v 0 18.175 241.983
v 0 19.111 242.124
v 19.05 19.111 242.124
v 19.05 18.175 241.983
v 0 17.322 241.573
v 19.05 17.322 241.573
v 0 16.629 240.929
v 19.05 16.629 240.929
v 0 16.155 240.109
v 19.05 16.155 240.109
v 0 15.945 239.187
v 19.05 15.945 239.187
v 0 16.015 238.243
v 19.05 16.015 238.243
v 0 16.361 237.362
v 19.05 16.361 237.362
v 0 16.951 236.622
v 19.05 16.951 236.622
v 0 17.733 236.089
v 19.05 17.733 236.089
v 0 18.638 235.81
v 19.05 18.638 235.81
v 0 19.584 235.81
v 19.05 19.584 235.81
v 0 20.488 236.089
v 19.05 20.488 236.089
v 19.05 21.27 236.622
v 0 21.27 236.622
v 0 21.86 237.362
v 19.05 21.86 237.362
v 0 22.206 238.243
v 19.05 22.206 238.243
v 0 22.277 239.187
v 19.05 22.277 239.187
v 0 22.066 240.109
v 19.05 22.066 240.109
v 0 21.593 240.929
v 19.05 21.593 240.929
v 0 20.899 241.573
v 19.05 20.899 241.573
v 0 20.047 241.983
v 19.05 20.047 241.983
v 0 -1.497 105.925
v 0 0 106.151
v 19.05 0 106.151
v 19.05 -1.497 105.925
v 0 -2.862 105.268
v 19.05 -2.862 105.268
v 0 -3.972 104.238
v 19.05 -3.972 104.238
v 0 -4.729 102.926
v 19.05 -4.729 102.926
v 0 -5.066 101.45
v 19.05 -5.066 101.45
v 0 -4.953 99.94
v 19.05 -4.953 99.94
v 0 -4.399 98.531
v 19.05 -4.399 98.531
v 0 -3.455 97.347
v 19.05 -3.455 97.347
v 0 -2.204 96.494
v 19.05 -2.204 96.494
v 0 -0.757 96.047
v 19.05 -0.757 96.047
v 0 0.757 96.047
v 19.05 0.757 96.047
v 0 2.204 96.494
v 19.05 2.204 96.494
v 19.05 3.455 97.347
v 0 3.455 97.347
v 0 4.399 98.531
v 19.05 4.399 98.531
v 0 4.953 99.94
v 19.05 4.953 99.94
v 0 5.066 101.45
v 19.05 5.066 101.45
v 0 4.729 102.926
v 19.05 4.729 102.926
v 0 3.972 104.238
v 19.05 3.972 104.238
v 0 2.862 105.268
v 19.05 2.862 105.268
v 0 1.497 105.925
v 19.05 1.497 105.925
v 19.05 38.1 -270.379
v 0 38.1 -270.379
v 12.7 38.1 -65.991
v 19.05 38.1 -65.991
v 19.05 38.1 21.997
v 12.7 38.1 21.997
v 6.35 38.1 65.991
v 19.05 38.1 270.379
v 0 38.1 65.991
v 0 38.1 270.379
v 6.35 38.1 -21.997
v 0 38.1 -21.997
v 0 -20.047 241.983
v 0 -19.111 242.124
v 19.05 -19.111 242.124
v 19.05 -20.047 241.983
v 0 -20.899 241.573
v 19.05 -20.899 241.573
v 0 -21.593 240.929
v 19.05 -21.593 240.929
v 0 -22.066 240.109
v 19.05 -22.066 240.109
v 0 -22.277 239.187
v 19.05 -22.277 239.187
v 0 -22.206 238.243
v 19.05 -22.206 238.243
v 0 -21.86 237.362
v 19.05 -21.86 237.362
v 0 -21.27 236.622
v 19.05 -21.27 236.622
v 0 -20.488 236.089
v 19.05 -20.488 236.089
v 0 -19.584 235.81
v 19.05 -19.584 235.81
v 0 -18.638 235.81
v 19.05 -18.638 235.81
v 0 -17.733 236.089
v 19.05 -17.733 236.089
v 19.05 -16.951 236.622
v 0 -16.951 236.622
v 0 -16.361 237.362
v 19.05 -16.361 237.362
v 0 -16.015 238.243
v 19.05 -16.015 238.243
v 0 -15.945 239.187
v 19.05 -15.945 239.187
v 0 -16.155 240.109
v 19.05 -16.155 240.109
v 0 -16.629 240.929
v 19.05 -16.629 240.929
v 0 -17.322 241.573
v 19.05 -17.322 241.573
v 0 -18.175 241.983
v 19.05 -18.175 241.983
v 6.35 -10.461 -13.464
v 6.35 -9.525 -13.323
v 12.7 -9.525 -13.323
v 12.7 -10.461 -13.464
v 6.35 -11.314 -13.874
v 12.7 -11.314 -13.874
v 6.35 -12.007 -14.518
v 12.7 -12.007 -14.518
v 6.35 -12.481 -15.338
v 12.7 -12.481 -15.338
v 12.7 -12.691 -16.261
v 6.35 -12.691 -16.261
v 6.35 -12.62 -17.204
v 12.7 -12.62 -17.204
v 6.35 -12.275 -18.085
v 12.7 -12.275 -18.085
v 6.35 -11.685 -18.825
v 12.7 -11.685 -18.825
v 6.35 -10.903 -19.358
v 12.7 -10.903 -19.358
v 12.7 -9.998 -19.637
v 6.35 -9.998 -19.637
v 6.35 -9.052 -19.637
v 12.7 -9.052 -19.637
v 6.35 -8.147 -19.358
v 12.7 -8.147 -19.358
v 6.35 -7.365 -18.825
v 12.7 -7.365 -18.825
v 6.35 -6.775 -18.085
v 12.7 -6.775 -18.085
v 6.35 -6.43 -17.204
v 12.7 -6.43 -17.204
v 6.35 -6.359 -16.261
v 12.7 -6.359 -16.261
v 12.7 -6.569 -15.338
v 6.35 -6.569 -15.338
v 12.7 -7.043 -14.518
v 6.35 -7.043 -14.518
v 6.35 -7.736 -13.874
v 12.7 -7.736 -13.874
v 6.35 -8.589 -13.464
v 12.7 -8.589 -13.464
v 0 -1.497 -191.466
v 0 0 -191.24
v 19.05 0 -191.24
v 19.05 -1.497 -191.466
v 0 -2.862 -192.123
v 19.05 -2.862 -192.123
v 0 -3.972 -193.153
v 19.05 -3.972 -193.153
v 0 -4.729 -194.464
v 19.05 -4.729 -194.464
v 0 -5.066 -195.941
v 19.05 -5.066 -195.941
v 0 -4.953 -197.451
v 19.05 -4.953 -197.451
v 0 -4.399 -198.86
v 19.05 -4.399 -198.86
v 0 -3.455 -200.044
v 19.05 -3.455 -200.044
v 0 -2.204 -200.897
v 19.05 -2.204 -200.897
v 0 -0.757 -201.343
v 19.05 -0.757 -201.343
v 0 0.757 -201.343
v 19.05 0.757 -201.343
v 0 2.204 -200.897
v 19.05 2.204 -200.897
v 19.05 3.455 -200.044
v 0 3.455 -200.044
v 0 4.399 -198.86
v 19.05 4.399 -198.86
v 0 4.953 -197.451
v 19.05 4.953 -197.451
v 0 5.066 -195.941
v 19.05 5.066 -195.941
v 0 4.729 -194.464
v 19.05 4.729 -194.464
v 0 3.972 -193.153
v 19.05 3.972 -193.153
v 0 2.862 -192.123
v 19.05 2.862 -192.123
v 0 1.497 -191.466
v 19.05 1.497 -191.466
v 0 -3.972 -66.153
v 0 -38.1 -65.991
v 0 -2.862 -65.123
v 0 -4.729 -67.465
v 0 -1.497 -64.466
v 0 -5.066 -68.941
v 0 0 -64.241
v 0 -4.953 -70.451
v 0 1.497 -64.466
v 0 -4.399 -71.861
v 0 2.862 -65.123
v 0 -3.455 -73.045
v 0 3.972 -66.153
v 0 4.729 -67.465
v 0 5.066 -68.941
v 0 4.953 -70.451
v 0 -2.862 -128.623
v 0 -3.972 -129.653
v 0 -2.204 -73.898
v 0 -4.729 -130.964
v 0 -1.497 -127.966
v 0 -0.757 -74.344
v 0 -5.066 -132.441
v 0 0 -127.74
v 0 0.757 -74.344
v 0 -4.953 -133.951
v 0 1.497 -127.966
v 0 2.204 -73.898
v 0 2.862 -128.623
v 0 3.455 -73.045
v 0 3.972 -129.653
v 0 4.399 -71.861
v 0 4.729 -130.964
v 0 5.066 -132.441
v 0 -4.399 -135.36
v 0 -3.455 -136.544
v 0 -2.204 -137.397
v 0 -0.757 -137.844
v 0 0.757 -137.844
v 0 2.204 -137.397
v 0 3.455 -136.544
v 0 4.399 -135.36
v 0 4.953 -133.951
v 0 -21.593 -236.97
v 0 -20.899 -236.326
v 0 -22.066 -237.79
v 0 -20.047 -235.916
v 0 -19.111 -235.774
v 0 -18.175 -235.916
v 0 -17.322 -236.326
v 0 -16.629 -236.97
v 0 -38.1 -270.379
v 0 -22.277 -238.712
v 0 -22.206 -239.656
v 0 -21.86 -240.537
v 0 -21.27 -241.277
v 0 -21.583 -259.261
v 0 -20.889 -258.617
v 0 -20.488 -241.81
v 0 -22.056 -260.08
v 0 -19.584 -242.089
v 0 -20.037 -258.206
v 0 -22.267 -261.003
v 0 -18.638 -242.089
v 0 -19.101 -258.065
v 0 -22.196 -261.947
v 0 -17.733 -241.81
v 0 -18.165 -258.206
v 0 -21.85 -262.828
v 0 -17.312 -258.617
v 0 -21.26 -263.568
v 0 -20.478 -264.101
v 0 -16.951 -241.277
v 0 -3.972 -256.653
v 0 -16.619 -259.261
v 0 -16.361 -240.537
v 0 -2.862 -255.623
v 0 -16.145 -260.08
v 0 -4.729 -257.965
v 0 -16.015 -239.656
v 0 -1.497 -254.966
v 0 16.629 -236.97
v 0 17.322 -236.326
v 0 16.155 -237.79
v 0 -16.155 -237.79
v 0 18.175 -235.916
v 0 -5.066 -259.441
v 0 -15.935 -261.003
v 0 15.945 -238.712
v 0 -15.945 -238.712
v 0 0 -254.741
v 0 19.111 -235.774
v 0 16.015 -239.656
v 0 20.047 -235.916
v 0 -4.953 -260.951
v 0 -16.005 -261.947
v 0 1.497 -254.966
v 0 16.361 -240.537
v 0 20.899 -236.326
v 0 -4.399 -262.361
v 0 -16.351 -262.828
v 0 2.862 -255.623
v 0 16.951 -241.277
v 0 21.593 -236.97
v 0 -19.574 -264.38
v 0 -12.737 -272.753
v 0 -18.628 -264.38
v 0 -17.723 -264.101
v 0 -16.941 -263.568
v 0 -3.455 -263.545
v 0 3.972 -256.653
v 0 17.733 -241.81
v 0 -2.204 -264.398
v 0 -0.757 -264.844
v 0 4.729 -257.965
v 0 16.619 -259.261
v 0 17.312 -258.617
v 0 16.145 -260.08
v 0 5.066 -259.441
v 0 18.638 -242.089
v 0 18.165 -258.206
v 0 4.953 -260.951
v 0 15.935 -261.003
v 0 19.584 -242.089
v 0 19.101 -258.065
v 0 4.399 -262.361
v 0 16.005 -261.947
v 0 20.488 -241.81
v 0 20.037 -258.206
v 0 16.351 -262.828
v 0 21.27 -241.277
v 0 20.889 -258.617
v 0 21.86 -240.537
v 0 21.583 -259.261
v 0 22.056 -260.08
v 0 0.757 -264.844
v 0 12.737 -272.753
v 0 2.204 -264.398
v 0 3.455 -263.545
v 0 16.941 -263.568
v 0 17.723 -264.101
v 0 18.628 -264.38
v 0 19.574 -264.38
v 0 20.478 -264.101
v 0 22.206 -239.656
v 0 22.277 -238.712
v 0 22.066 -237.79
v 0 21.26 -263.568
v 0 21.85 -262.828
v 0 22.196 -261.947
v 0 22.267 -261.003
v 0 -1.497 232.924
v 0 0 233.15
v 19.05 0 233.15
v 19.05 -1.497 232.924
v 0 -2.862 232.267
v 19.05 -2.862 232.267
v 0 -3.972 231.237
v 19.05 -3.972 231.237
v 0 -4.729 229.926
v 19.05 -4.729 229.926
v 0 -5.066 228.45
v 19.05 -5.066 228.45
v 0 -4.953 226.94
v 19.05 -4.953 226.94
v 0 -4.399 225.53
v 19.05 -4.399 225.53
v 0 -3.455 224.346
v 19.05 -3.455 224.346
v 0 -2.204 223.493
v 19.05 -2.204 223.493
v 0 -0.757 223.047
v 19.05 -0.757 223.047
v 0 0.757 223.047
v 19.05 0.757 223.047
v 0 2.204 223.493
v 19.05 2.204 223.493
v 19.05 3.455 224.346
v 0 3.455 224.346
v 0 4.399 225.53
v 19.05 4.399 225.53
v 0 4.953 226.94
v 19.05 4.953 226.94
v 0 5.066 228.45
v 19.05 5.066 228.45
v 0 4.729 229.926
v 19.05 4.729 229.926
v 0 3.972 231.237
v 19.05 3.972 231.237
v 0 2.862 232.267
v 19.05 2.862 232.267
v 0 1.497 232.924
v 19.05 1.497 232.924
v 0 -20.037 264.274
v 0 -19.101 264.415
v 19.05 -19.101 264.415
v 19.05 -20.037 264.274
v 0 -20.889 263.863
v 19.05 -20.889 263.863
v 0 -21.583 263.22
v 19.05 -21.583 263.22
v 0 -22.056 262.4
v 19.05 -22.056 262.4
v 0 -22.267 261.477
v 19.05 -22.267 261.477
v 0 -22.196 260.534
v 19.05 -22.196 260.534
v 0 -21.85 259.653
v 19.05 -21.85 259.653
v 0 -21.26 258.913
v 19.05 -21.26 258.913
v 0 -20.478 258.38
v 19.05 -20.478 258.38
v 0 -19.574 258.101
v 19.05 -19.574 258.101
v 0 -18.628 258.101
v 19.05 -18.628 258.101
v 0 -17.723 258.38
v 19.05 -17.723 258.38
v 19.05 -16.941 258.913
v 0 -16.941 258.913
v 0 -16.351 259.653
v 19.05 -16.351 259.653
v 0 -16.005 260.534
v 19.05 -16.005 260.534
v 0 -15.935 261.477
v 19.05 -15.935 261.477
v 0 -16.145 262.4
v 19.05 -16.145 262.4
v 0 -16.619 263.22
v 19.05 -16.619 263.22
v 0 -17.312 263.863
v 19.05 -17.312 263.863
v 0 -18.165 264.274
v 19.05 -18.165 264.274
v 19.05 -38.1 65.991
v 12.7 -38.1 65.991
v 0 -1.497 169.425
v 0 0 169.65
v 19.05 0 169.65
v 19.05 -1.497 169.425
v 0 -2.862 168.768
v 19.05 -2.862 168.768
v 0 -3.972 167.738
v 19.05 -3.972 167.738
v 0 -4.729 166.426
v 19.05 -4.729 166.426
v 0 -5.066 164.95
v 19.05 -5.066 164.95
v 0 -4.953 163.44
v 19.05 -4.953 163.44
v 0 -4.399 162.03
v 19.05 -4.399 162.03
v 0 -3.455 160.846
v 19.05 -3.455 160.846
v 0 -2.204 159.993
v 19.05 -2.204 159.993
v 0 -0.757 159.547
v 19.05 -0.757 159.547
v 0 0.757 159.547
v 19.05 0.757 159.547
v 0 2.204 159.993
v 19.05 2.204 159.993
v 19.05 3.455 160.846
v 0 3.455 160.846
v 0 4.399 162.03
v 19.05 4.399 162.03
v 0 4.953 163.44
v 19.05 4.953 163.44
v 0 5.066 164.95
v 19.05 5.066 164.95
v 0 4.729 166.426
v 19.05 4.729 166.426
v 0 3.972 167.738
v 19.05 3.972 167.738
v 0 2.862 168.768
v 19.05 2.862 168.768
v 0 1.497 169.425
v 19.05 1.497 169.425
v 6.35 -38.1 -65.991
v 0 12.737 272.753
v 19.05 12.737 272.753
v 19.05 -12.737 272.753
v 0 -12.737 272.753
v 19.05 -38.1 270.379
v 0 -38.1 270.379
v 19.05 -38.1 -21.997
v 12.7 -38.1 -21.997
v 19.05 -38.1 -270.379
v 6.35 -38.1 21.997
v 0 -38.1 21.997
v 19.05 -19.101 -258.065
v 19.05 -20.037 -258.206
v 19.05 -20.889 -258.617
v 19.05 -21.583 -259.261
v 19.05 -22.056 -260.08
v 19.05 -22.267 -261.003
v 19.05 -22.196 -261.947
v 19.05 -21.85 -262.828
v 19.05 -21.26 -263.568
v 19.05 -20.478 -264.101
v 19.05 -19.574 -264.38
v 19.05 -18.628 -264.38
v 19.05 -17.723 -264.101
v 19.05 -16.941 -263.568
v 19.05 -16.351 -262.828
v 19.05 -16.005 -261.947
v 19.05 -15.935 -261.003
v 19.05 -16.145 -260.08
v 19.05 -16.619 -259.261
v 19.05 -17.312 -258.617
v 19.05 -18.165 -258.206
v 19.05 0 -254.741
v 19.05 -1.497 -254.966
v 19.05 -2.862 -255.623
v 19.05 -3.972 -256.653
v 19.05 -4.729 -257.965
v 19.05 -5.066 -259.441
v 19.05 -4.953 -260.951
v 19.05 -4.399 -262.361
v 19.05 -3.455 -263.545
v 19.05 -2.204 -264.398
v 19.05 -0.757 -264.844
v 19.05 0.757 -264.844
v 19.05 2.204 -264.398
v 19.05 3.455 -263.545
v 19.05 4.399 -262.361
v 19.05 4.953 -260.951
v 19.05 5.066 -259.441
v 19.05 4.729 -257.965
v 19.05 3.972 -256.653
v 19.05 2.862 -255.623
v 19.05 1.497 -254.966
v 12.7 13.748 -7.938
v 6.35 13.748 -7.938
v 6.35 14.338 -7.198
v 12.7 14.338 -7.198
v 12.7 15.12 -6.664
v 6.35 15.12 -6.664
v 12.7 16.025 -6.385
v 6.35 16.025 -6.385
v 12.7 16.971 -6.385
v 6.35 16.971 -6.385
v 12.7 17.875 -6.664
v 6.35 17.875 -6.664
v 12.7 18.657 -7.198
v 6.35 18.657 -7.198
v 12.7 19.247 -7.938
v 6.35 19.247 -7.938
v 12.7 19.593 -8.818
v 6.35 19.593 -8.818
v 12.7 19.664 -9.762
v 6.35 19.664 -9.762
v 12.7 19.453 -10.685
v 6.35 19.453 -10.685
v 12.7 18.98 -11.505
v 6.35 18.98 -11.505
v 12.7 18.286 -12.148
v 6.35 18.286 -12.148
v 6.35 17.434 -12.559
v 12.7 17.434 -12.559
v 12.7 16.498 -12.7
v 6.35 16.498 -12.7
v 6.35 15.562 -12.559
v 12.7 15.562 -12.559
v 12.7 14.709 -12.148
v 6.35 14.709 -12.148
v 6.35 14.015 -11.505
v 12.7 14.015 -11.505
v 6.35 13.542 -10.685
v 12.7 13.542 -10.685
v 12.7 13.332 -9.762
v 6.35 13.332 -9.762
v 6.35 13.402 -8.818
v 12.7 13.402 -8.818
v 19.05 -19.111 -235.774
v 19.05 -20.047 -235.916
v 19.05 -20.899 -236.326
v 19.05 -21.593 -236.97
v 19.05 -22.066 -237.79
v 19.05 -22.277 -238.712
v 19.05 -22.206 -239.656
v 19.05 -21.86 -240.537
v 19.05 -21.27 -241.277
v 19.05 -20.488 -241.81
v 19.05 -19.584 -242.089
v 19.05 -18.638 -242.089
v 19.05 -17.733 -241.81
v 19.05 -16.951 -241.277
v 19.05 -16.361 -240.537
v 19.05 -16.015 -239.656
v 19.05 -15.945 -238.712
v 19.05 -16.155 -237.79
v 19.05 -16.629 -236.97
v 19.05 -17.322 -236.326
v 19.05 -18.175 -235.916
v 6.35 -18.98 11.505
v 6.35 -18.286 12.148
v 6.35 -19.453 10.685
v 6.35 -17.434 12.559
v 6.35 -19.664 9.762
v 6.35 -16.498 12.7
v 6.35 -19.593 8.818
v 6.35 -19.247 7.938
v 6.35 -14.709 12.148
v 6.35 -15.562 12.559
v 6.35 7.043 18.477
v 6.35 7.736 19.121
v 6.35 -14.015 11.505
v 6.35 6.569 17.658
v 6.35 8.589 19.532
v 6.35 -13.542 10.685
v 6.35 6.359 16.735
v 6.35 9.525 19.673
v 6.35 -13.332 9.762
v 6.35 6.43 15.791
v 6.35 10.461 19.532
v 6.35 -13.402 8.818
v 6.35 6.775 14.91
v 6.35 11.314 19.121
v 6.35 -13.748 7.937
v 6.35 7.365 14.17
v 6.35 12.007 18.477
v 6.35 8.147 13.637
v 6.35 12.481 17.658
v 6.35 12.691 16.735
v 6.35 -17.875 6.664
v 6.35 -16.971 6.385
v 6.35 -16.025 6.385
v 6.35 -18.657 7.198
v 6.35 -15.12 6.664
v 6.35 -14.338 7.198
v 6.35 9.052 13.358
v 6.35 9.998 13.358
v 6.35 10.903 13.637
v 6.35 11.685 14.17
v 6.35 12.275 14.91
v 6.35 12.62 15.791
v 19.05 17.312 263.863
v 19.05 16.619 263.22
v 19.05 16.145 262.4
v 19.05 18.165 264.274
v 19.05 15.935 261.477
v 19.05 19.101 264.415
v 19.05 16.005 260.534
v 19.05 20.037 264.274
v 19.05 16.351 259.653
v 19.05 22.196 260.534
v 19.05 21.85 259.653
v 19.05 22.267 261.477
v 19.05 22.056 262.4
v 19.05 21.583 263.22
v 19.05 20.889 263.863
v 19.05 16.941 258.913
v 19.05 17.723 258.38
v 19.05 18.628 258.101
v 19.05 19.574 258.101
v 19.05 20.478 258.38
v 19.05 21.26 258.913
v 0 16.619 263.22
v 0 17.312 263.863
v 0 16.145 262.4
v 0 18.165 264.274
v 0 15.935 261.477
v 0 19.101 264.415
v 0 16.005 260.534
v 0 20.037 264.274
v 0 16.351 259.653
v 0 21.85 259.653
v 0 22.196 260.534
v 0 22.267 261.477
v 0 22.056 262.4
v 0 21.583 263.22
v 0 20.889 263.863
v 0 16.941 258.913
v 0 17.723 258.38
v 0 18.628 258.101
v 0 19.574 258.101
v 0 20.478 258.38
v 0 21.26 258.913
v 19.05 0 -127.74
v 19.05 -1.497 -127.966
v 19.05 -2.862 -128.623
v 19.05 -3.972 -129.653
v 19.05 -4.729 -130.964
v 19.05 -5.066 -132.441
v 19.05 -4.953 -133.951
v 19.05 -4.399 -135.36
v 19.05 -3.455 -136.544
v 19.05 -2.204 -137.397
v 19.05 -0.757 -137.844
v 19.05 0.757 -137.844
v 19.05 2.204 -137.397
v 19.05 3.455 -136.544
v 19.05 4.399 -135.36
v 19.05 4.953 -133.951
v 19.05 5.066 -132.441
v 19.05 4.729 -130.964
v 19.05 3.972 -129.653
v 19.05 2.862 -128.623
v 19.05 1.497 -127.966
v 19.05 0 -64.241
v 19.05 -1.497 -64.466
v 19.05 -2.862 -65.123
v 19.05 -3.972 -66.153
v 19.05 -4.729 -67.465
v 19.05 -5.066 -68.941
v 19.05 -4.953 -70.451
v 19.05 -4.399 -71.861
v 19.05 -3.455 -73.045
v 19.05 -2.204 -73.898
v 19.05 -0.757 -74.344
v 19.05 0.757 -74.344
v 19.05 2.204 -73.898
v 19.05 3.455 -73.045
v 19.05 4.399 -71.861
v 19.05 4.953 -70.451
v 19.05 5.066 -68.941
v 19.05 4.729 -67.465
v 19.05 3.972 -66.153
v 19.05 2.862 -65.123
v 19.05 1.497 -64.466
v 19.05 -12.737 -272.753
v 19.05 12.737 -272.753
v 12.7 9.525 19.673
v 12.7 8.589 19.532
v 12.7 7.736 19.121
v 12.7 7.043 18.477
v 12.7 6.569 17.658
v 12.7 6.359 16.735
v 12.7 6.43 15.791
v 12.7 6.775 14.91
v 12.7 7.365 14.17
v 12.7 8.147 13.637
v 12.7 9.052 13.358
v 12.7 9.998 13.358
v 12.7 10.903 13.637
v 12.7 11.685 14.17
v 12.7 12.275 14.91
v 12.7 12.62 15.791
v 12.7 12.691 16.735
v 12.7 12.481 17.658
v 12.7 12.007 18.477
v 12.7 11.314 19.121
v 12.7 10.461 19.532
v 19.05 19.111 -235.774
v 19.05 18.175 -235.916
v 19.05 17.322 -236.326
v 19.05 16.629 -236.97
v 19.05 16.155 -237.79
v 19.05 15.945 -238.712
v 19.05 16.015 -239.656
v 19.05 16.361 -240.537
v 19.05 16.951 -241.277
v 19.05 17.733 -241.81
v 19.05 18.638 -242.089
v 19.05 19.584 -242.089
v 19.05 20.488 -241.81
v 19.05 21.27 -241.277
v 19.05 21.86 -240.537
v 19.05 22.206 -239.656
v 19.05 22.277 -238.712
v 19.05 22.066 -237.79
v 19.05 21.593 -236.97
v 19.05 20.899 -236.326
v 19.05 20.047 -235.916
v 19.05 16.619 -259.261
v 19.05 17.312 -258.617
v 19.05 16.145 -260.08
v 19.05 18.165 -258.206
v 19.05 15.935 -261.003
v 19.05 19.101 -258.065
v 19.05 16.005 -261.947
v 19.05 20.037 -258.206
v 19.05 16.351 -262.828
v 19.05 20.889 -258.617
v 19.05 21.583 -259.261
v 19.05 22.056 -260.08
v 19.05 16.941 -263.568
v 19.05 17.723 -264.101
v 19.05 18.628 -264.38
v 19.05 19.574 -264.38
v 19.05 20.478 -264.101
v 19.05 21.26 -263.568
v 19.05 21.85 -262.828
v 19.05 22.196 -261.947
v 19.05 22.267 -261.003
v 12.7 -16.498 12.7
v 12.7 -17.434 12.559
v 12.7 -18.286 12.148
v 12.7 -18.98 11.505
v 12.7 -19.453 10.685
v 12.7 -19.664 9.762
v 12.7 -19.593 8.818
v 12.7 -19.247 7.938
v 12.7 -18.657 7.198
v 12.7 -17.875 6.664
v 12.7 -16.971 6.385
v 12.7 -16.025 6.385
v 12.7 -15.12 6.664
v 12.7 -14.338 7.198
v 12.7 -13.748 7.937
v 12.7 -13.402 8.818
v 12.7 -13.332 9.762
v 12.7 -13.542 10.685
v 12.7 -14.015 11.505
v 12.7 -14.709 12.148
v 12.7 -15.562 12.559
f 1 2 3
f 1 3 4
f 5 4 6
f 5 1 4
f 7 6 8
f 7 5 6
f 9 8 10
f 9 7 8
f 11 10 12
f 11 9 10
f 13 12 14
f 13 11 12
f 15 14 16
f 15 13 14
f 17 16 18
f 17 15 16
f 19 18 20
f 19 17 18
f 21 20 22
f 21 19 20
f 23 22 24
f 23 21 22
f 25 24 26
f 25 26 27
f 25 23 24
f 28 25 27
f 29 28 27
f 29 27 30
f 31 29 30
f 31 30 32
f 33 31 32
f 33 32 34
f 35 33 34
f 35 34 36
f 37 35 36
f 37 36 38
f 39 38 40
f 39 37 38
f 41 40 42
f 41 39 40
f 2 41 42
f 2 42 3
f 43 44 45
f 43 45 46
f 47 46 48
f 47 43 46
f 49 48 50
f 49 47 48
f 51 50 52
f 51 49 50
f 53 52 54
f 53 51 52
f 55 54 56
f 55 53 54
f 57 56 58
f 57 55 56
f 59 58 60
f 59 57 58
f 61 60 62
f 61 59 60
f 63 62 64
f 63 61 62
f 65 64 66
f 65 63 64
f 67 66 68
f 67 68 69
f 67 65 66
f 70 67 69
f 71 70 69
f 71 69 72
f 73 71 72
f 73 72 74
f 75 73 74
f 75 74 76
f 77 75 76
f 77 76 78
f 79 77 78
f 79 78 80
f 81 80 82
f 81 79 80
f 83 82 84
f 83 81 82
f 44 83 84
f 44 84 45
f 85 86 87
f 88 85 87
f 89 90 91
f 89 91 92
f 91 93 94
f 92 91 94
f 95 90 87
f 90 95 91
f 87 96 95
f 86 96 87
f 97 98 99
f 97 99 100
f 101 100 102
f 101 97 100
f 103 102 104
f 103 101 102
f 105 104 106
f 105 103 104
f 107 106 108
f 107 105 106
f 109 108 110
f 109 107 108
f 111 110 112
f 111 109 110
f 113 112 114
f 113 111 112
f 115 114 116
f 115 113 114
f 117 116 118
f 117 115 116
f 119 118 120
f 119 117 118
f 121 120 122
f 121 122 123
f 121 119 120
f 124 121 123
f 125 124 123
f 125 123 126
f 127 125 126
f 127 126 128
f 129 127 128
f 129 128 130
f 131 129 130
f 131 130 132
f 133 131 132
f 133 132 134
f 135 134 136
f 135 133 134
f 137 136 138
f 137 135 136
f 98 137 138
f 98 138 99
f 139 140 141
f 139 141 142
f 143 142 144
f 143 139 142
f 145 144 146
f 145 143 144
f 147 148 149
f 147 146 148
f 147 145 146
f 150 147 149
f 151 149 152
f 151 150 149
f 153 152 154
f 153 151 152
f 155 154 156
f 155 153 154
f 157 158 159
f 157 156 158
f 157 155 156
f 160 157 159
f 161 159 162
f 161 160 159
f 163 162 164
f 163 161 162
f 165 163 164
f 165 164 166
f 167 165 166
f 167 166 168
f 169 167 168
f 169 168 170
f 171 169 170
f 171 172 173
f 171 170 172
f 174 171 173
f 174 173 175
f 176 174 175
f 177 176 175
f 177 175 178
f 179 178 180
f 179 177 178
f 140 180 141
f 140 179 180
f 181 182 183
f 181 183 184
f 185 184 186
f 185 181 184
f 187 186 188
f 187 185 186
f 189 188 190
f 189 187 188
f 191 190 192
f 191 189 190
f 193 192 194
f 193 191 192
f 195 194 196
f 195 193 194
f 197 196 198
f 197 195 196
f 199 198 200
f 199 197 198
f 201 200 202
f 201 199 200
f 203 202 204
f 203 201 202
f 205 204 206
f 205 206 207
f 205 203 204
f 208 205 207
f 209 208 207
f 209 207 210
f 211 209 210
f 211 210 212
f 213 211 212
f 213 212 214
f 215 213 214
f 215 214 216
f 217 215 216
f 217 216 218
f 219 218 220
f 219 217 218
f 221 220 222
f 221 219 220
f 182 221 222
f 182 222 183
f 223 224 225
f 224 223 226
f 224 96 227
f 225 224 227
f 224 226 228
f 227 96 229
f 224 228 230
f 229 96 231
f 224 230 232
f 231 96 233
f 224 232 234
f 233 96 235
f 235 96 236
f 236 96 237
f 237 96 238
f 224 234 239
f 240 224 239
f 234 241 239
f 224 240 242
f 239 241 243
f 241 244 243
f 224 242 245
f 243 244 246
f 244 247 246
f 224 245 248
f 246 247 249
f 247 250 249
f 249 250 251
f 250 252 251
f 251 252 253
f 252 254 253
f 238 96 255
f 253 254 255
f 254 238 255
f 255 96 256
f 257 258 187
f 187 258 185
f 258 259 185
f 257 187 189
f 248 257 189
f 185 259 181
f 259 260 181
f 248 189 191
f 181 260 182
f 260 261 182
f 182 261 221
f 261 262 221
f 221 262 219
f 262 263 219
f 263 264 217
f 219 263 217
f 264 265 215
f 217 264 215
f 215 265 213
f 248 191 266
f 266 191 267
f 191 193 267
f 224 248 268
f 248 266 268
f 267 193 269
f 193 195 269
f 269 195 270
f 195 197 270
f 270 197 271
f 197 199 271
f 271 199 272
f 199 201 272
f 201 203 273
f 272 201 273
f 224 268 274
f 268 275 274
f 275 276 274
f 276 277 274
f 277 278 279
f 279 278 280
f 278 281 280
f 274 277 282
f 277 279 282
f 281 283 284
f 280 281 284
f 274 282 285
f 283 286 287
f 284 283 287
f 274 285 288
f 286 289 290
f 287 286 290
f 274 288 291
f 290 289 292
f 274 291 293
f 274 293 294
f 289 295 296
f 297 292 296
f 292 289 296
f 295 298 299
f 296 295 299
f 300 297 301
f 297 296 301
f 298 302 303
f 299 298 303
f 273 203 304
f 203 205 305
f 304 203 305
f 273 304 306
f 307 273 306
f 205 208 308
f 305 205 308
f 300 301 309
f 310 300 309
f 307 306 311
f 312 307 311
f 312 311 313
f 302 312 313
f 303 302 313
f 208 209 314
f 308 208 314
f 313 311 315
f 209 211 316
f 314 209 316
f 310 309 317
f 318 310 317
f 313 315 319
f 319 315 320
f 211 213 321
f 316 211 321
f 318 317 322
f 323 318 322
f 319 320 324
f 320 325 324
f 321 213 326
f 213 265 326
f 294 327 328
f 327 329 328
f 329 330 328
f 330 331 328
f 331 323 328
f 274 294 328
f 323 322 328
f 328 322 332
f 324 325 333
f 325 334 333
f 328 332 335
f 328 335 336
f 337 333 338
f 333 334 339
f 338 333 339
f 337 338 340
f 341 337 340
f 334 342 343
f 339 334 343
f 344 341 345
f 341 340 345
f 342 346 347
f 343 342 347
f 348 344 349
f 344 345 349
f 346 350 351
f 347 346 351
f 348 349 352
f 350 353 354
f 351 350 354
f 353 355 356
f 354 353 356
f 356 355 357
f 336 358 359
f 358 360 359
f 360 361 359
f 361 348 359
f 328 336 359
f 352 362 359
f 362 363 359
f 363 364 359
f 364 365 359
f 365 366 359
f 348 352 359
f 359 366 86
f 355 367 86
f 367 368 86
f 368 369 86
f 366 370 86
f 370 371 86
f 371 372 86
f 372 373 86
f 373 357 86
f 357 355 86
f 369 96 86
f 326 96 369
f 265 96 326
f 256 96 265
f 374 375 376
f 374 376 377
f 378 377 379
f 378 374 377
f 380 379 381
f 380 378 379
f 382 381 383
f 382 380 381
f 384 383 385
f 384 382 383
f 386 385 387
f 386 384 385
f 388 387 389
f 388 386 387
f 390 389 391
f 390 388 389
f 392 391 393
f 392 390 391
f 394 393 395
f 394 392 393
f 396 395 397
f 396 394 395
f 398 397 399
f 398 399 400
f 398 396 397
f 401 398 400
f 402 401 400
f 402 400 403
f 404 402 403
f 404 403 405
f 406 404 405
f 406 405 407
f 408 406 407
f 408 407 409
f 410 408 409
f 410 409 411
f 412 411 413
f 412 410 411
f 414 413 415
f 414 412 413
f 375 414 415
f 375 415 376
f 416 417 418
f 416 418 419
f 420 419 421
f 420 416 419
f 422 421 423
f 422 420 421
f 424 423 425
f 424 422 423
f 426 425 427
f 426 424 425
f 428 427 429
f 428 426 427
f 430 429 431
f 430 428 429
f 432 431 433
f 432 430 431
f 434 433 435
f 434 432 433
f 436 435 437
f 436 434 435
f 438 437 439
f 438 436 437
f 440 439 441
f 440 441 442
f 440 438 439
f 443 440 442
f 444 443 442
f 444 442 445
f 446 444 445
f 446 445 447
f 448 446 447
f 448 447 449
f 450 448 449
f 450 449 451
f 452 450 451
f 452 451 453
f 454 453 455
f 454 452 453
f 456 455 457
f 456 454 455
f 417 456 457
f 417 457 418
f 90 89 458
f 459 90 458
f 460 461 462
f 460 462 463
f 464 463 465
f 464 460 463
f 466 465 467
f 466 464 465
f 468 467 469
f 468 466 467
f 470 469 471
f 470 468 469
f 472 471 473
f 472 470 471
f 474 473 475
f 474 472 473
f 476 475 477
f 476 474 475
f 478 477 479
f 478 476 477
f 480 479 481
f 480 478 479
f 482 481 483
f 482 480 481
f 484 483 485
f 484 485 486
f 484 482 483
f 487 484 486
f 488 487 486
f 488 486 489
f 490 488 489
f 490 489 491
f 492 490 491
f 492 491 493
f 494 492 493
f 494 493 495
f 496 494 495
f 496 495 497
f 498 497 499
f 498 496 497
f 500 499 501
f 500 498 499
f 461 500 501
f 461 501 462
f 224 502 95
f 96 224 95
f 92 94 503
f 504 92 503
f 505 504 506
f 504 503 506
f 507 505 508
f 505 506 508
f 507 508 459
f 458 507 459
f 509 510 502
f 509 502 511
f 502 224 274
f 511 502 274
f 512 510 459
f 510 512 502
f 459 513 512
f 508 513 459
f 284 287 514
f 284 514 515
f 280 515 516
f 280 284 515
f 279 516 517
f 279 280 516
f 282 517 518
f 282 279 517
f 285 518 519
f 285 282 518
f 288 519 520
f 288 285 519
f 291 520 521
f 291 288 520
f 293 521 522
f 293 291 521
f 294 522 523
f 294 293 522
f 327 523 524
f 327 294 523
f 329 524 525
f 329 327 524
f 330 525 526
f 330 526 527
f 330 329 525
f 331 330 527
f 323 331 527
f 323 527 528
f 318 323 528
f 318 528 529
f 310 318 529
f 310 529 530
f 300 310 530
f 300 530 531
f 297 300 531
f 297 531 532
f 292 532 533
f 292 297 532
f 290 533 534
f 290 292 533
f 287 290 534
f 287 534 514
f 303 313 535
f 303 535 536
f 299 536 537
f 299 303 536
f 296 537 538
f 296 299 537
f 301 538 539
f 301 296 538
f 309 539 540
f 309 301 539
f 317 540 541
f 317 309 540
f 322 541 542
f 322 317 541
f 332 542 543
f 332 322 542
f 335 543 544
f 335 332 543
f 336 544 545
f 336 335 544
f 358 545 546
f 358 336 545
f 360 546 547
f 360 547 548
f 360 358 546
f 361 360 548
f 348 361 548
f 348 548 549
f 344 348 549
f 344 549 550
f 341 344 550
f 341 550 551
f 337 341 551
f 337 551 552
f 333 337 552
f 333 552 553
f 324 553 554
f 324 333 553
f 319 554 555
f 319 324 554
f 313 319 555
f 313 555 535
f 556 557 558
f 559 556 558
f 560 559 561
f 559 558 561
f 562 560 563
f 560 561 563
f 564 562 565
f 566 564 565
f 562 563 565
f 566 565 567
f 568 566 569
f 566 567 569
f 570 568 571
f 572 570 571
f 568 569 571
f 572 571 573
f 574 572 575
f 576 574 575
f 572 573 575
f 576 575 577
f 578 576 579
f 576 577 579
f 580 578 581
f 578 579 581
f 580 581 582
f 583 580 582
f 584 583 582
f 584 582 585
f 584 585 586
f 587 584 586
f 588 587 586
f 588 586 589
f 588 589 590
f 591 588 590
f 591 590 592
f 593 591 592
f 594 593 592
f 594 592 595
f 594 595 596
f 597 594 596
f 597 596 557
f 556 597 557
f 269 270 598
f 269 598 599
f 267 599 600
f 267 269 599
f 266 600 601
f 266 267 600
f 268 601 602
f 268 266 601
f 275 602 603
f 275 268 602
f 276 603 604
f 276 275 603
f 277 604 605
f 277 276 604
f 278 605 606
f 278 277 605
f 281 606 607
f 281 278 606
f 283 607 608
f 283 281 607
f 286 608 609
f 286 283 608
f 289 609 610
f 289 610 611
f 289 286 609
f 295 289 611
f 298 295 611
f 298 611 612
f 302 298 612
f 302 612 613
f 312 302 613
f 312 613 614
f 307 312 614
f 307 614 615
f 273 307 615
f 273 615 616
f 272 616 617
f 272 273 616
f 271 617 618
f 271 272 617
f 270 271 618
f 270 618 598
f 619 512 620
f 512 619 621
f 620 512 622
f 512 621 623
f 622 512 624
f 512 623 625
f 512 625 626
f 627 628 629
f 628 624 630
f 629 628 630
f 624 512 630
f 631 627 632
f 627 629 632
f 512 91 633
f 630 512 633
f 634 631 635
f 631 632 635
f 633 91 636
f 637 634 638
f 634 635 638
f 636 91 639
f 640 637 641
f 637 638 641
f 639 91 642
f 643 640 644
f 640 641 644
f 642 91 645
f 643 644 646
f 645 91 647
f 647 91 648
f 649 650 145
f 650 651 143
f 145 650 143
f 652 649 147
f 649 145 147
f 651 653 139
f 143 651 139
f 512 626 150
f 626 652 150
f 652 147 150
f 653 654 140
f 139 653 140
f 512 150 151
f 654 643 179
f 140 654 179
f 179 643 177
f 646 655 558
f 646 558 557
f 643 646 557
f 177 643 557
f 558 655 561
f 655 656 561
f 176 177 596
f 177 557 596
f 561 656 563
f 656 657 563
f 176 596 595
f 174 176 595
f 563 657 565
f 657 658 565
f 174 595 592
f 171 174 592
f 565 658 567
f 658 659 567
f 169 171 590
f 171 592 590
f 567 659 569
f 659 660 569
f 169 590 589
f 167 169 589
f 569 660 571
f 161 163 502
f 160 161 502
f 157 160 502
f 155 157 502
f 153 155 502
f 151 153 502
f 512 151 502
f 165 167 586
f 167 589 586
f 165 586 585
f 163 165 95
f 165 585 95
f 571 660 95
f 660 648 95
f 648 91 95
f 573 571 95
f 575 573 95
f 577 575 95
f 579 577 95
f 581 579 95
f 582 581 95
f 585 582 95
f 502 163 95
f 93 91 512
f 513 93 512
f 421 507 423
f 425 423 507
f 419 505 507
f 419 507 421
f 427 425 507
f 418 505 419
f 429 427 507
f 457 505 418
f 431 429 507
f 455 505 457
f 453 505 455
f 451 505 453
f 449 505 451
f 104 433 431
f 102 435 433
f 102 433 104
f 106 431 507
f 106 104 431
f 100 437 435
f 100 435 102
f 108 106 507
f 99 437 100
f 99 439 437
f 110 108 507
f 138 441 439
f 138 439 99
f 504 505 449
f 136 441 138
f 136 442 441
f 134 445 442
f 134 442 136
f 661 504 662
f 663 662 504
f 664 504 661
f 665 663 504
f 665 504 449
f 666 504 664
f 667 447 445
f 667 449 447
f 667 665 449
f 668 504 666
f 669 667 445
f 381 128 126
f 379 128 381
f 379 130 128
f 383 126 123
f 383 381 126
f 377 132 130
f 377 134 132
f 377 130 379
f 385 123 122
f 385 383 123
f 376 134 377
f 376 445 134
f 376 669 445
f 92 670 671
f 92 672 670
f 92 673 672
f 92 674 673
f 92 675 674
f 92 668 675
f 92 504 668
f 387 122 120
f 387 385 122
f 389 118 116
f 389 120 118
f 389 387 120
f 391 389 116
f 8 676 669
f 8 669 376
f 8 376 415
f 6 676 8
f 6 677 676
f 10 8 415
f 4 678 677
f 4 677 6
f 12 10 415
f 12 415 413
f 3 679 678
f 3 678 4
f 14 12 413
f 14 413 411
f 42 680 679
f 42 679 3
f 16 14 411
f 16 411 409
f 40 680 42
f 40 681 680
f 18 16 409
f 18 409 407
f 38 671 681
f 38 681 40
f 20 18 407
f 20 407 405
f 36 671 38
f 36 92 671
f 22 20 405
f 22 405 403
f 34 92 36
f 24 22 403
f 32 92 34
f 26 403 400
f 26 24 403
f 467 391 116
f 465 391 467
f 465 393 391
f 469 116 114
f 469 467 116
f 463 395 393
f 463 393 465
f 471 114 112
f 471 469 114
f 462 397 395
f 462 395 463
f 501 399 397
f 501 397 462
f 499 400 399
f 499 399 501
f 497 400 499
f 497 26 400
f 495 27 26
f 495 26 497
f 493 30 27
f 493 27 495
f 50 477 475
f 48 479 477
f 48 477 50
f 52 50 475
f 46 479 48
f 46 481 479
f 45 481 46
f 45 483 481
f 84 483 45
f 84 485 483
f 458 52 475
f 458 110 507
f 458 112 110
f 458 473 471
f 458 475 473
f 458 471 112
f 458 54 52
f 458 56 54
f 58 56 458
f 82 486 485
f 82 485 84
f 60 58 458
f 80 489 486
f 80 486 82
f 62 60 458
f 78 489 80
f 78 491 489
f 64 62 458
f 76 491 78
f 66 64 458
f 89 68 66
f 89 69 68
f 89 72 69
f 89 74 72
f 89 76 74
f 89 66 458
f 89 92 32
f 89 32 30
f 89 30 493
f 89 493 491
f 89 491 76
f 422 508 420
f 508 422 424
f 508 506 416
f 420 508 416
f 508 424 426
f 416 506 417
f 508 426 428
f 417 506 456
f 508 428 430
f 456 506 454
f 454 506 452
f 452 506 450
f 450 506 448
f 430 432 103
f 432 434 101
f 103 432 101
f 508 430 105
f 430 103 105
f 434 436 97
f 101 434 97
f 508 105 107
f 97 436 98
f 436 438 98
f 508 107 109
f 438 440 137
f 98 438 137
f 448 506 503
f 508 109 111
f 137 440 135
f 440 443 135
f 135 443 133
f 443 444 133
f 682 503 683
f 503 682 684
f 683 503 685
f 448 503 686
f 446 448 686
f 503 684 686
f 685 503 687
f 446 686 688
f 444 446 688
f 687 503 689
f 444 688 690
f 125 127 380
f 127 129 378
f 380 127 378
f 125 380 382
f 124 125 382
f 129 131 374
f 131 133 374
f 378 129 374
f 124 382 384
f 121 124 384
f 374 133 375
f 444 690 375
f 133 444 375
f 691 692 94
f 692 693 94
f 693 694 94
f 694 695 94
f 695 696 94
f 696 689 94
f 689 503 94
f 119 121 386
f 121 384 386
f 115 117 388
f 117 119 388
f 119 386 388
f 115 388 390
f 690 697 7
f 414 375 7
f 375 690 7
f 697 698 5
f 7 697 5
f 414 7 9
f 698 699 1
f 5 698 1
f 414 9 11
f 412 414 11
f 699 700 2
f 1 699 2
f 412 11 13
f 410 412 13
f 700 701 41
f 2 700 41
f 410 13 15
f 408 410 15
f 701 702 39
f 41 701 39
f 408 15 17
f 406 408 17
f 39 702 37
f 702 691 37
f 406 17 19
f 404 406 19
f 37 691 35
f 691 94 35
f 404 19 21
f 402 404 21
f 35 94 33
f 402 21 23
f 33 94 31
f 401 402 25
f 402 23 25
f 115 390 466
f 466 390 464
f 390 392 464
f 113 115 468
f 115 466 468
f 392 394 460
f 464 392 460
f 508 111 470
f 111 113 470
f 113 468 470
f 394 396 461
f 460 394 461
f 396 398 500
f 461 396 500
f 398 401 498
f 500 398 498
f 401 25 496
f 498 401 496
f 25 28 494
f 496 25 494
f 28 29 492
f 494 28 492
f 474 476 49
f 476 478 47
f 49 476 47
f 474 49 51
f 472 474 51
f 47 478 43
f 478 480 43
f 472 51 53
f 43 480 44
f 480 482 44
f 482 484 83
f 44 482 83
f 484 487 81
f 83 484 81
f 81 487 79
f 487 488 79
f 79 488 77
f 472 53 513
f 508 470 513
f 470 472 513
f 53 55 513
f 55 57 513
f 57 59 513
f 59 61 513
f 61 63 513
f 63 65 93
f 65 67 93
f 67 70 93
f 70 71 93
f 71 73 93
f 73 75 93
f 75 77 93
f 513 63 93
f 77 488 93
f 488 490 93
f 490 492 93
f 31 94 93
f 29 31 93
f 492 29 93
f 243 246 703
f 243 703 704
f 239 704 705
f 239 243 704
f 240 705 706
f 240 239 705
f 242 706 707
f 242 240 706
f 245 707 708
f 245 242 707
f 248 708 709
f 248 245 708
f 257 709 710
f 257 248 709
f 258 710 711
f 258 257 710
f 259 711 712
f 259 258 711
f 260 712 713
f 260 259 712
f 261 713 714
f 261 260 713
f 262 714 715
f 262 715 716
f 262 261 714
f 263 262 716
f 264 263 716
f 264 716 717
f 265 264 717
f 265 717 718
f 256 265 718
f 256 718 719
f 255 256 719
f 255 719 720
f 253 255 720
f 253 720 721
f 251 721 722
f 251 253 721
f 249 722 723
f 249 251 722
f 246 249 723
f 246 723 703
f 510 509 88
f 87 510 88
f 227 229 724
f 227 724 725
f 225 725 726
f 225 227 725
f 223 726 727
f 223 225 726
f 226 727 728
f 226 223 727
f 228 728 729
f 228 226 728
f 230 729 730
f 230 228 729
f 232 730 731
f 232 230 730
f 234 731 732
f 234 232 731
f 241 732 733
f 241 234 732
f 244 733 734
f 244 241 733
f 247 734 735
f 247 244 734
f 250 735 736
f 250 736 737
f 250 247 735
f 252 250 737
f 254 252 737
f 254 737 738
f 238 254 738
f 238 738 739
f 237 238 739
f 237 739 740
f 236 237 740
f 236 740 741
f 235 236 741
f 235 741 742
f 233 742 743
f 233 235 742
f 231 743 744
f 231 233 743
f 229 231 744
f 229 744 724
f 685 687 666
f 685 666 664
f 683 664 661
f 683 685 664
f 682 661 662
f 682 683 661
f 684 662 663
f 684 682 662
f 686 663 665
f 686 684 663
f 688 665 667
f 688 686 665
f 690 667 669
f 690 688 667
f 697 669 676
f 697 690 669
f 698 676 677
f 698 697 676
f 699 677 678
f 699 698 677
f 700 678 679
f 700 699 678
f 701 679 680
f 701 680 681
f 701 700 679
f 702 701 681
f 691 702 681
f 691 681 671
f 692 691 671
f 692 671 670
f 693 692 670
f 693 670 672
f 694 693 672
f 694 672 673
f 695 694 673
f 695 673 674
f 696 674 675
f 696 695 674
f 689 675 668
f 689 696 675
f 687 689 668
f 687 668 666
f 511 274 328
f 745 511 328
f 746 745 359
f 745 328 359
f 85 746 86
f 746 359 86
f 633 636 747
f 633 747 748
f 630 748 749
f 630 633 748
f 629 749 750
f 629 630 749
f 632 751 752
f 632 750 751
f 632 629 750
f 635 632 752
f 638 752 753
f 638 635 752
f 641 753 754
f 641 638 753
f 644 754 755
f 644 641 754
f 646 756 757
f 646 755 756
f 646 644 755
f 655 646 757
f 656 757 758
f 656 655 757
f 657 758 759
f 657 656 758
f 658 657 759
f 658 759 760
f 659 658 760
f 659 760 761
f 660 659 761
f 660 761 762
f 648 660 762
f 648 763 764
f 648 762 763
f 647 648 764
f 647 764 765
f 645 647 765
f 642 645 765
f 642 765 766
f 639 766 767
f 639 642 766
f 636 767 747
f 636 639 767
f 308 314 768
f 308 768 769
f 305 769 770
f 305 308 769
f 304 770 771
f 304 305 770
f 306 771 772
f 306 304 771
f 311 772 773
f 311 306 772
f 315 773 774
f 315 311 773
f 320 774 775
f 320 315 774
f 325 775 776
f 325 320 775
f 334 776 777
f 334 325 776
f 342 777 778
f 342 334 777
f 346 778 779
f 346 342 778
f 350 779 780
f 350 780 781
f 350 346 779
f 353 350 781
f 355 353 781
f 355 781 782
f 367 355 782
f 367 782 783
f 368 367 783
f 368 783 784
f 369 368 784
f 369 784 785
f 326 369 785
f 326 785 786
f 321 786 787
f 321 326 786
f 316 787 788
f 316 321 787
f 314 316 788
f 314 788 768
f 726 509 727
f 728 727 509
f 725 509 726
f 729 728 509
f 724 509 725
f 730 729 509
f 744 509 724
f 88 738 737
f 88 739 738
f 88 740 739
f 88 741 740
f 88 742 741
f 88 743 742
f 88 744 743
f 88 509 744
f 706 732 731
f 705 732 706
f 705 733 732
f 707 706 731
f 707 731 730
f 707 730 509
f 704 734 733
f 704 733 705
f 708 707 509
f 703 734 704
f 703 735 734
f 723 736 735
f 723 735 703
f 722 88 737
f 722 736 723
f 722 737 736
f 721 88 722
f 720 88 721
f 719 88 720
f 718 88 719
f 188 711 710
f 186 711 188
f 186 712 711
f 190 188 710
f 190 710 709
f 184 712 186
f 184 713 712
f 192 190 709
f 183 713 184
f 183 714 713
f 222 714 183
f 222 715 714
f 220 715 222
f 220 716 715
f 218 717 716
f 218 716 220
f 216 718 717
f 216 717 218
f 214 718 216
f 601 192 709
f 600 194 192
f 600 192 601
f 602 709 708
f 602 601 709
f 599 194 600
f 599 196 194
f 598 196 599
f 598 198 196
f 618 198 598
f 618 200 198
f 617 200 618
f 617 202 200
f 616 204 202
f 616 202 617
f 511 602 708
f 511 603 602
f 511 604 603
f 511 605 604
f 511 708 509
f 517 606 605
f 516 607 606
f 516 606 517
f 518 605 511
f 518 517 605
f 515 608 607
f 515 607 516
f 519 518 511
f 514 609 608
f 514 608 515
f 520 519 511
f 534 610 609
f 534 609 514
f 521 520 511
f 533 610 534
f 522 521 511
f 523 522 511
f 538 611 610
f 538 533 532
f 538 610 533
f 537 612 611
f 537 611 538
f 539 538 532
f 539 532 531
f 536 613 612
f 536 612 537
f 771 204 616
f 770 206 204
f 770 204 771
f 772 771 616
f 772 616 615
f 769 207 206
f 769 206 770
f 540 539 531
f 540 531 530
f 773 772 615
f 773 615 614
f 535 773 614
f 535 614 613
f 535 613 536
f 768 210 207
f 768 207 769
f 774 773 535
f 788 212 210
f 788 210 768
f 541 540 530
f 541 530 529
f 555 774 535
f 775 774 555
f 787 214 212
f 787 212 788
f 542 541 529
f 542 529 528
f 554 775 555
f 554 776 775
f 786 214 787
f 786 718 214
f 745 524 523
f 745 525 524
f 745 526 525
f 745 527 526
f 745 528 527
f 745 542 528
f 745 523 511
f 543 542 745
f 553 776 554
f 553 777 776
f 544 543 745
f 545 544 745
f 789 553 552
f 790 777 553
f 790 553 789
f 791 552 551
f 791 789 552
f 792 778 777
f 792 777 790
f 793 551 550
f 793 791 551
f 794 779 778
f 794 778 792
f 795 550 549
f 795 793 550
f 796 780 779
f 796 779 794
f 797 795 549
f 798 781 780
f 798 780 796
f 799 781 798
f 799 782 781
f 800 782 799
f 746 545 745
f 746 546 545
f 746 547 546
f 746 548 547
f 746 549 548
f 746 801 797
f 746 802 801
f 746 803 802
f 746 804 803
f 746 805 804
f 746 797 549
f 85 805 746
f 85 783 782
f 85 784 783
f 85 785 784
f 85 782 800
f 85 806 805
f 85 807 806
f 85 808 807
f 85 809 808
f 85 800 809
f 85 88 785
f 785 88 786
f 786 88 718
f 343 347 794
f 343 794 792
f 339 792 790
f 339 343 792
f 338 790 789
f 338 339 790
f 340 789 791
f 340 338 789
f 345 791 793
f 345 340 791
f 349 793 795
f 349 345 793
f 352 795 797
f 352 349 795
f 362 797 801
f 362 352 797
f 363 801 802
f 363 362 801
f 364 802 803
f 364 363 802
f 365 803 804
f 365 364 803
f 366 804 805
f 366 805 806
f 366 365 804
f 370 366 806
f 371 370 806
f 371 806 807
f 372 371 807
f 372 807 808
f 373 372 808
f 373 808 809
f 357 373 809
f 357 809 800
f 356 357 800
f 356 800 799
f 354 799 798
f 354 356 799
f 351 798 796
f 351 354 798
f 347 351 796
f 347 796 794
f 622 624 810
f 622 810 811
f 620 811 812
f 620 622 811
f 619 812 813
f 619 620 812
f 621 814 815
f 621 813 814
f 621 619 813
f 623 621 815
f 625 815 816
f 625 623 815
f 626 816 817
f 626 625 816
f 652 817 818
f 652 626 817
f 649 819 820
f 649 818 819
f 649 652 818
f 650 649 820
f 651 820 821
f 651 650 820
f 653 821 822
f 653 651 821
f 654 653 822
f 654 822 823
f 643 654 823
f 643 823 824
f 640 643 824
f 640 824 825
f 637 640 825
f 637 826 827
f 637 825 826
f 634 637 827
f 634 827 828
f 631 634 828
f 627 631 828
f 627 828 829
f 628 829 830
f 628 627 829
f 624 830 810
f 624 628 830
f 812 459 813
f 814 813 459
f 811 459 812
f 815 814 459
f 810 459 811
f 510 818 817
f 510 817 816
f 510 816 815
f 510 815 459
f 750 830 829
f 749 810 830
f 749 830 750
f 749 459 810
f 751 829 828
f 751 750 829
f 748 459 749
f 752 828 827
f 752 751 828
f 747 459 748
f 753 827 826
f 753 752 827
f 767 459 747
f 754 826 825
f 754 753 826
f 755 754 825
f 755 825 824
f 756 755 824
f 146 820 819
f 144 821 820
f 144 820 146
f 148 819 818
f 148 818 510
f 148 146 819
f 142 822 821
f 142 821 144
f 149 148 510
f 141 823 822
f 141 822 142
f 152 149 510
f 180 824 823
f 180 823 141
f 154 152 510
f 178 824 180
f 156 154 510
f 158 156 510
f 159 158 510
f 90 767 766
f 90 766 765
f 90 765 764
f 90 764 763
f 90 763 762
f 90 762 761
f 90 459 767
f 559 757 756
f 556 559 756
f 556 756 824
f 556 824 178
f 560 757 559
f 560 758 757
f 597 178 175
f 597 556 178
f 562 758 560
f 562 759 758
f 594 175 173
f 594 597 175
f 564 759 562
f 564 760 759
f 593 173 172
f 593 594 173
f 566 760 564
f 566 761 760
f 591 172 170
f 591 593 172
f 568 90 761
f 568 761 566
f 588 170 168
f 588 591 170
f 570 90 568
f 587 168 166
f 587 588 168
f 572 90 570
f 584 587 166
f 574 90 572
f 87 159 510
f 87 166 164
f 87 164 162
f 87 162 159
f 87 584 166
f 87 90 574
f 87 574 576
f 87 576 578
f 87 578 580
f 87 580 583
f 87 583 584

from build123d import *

# Parameters (mm, degrees)
SKETCH2_R           = 3.175
SKETCH2_R_2         = 5.08
BOSS_EXTRUDE1_DEPTH = 19.05
CUT_EXTRUDE2_START  = -12.7
CUT_EXTRUDE2_DEPTH  = 6.35
CUT_EXTRUDE3_DEPTH  = 6.35


with BuildPart() as part:
    # Sketch2 → Boss-Extrude1 (new body)
    with BuildSketch(Plane(origin=(0, 0, 0), x_dir=(0, 0, -1), z_dir=(1, 0, 0))):
        with BuildLine():
            Line((21.997045256, 38.1), (-270.378794472, 38.1))
            ThreePointArc((-270.378794472, 38.1), (-273.05, 0), (-270.378794472, -38.1))
            Line((-270.378794472, -38.1), (270.378794472, -38.1))
            ThreePointArc((270.378794472, -38.1), (273.05, 0), (270.378794472, 38.1))
            Line((270.378794472, 38.1), (21.997045256, 38.1))
        make_face()
        with BuildLine():
            ThreePointArc((11.1125, 19.247414599), (12.274630657, 14.910283942), (7.9375, 13.748153285))
            ThreePointArc((7.9375, 13.748153285), (6.775369343, 18.085283942), (11.1125, 19.247414599))
        make_face(mode=Mode.SUBTRACT)
        with Locations((-16.497783942, 9.525)):
            Circle(SKETCH2_R, mode=Mode.SUBTRACT)
        with Locations((-9.525, -16.497783942)):
            Circle(SKETCH2_R, mode=Mode.SUBTRACT)
        with Locations((16.497783942, -9.525)):
            Circle(SKETCH2_R, mode=Mode.SUBTRACT)
        with Locations((-228.070127818, 0)):
            Circle(SKETCH2_R_2, mode=Mode.SUBTRACT)
        with Locations((-101.070508964, 0)):
            Circle(SKETCH2_R_2, mode=Mode.SUBTRACT)
        with Locations((-164.570319717, 0)):
            Circle(SKETCH2_R_2, mode=Mode.SUBTRACT)
        with Locations((196.320223938, 0)):
            Circle(SKETCH2_R_2, mode=Mode.SUBTRACT)
        with Locations((132.82041491, 0)):
            Circle(SKETCH2_R_2, mode=Mode.SUBTRACT)
        with Locations((69.320600315, 0)):
            Circle(SKETCH2_R_2, mode=Mode.SUBTRACT)
        with Locations((-261.240141142, 19.100852393)):
            Circle(SKETCH2_R, mode=Mode.SUBTRACT)
        with Locations((-238.949490115, 19.110830171)):
            Circle(SKETCH2_R, mode=Mode.SUBTRACT)
        with Locations((-261.240141142, -19.100852393)):
            Circle(SKETCH2_R, mode=Mode.SUBTRACT)
        with Locations((-238.949490115, -19.110830171)):
            Circle(SKETCH2_R, mode=Mode.SUBTRACT)
        with Locations((261.240141142, 19.100852393)):
            Circle(SKETCH2_R, mode=Mode.SUBTRACT)
        with Locations((238.949490115, 19.110830171)):
            Circle(SKETCH2_R, mode=Mode.SUBTRACT)
        with Locations((259.820783483, 0)):
            Circle(SKETCH2_R_2, mode=Mode.SUBTRACT)
        with Locations((238.949490115, -19.110830171)):
            Circle(SKETCH2_R, mode=Mode.SUBTRACT)
        with Locations((261.240141142, -19.100852393)):
            Circle(SKETCH2_R, mode=Mode.SUBTRACT)
    extrude(amount=BOSS_EXTRUDE1_DEPTH)

    # Sketch3 → Cut-Extrude2 (cut)
    with BuildSketch(Plane(origin=(19.05, 0, 0), x_dir=(0, 0, -1), z_dir=(1, 0, 0)).offset(CUT_EXTRUDE2_START)):
        Polygon((65.991135768, -38.1), (21.997045256, 38.1), (-65.991135768, 38.1), (-21.997045256, -38.1), align=None)
    extrude(amount=-CUT_EXTRUDE2_DEPTH, mode=Mode.SUBTRACT)

    # Sketch3<5> → Cut-Extrude3 (cut)
    with BuildSketch(Plane(origin=(19.05, 0, 0), x_dir=(0, 0, -1), z_dir=(1, 0, 0))):
        Polygon((21.997045256, -38.1), (65.991135768, 38.1), (-21.997045256, 38.1), (-65.991135768, -38.1), align=None)
    extrude(amount=-CUT_EXTRUDE3_DEPTH, mode=Mode.SUBTRACT)


solid = part.part
